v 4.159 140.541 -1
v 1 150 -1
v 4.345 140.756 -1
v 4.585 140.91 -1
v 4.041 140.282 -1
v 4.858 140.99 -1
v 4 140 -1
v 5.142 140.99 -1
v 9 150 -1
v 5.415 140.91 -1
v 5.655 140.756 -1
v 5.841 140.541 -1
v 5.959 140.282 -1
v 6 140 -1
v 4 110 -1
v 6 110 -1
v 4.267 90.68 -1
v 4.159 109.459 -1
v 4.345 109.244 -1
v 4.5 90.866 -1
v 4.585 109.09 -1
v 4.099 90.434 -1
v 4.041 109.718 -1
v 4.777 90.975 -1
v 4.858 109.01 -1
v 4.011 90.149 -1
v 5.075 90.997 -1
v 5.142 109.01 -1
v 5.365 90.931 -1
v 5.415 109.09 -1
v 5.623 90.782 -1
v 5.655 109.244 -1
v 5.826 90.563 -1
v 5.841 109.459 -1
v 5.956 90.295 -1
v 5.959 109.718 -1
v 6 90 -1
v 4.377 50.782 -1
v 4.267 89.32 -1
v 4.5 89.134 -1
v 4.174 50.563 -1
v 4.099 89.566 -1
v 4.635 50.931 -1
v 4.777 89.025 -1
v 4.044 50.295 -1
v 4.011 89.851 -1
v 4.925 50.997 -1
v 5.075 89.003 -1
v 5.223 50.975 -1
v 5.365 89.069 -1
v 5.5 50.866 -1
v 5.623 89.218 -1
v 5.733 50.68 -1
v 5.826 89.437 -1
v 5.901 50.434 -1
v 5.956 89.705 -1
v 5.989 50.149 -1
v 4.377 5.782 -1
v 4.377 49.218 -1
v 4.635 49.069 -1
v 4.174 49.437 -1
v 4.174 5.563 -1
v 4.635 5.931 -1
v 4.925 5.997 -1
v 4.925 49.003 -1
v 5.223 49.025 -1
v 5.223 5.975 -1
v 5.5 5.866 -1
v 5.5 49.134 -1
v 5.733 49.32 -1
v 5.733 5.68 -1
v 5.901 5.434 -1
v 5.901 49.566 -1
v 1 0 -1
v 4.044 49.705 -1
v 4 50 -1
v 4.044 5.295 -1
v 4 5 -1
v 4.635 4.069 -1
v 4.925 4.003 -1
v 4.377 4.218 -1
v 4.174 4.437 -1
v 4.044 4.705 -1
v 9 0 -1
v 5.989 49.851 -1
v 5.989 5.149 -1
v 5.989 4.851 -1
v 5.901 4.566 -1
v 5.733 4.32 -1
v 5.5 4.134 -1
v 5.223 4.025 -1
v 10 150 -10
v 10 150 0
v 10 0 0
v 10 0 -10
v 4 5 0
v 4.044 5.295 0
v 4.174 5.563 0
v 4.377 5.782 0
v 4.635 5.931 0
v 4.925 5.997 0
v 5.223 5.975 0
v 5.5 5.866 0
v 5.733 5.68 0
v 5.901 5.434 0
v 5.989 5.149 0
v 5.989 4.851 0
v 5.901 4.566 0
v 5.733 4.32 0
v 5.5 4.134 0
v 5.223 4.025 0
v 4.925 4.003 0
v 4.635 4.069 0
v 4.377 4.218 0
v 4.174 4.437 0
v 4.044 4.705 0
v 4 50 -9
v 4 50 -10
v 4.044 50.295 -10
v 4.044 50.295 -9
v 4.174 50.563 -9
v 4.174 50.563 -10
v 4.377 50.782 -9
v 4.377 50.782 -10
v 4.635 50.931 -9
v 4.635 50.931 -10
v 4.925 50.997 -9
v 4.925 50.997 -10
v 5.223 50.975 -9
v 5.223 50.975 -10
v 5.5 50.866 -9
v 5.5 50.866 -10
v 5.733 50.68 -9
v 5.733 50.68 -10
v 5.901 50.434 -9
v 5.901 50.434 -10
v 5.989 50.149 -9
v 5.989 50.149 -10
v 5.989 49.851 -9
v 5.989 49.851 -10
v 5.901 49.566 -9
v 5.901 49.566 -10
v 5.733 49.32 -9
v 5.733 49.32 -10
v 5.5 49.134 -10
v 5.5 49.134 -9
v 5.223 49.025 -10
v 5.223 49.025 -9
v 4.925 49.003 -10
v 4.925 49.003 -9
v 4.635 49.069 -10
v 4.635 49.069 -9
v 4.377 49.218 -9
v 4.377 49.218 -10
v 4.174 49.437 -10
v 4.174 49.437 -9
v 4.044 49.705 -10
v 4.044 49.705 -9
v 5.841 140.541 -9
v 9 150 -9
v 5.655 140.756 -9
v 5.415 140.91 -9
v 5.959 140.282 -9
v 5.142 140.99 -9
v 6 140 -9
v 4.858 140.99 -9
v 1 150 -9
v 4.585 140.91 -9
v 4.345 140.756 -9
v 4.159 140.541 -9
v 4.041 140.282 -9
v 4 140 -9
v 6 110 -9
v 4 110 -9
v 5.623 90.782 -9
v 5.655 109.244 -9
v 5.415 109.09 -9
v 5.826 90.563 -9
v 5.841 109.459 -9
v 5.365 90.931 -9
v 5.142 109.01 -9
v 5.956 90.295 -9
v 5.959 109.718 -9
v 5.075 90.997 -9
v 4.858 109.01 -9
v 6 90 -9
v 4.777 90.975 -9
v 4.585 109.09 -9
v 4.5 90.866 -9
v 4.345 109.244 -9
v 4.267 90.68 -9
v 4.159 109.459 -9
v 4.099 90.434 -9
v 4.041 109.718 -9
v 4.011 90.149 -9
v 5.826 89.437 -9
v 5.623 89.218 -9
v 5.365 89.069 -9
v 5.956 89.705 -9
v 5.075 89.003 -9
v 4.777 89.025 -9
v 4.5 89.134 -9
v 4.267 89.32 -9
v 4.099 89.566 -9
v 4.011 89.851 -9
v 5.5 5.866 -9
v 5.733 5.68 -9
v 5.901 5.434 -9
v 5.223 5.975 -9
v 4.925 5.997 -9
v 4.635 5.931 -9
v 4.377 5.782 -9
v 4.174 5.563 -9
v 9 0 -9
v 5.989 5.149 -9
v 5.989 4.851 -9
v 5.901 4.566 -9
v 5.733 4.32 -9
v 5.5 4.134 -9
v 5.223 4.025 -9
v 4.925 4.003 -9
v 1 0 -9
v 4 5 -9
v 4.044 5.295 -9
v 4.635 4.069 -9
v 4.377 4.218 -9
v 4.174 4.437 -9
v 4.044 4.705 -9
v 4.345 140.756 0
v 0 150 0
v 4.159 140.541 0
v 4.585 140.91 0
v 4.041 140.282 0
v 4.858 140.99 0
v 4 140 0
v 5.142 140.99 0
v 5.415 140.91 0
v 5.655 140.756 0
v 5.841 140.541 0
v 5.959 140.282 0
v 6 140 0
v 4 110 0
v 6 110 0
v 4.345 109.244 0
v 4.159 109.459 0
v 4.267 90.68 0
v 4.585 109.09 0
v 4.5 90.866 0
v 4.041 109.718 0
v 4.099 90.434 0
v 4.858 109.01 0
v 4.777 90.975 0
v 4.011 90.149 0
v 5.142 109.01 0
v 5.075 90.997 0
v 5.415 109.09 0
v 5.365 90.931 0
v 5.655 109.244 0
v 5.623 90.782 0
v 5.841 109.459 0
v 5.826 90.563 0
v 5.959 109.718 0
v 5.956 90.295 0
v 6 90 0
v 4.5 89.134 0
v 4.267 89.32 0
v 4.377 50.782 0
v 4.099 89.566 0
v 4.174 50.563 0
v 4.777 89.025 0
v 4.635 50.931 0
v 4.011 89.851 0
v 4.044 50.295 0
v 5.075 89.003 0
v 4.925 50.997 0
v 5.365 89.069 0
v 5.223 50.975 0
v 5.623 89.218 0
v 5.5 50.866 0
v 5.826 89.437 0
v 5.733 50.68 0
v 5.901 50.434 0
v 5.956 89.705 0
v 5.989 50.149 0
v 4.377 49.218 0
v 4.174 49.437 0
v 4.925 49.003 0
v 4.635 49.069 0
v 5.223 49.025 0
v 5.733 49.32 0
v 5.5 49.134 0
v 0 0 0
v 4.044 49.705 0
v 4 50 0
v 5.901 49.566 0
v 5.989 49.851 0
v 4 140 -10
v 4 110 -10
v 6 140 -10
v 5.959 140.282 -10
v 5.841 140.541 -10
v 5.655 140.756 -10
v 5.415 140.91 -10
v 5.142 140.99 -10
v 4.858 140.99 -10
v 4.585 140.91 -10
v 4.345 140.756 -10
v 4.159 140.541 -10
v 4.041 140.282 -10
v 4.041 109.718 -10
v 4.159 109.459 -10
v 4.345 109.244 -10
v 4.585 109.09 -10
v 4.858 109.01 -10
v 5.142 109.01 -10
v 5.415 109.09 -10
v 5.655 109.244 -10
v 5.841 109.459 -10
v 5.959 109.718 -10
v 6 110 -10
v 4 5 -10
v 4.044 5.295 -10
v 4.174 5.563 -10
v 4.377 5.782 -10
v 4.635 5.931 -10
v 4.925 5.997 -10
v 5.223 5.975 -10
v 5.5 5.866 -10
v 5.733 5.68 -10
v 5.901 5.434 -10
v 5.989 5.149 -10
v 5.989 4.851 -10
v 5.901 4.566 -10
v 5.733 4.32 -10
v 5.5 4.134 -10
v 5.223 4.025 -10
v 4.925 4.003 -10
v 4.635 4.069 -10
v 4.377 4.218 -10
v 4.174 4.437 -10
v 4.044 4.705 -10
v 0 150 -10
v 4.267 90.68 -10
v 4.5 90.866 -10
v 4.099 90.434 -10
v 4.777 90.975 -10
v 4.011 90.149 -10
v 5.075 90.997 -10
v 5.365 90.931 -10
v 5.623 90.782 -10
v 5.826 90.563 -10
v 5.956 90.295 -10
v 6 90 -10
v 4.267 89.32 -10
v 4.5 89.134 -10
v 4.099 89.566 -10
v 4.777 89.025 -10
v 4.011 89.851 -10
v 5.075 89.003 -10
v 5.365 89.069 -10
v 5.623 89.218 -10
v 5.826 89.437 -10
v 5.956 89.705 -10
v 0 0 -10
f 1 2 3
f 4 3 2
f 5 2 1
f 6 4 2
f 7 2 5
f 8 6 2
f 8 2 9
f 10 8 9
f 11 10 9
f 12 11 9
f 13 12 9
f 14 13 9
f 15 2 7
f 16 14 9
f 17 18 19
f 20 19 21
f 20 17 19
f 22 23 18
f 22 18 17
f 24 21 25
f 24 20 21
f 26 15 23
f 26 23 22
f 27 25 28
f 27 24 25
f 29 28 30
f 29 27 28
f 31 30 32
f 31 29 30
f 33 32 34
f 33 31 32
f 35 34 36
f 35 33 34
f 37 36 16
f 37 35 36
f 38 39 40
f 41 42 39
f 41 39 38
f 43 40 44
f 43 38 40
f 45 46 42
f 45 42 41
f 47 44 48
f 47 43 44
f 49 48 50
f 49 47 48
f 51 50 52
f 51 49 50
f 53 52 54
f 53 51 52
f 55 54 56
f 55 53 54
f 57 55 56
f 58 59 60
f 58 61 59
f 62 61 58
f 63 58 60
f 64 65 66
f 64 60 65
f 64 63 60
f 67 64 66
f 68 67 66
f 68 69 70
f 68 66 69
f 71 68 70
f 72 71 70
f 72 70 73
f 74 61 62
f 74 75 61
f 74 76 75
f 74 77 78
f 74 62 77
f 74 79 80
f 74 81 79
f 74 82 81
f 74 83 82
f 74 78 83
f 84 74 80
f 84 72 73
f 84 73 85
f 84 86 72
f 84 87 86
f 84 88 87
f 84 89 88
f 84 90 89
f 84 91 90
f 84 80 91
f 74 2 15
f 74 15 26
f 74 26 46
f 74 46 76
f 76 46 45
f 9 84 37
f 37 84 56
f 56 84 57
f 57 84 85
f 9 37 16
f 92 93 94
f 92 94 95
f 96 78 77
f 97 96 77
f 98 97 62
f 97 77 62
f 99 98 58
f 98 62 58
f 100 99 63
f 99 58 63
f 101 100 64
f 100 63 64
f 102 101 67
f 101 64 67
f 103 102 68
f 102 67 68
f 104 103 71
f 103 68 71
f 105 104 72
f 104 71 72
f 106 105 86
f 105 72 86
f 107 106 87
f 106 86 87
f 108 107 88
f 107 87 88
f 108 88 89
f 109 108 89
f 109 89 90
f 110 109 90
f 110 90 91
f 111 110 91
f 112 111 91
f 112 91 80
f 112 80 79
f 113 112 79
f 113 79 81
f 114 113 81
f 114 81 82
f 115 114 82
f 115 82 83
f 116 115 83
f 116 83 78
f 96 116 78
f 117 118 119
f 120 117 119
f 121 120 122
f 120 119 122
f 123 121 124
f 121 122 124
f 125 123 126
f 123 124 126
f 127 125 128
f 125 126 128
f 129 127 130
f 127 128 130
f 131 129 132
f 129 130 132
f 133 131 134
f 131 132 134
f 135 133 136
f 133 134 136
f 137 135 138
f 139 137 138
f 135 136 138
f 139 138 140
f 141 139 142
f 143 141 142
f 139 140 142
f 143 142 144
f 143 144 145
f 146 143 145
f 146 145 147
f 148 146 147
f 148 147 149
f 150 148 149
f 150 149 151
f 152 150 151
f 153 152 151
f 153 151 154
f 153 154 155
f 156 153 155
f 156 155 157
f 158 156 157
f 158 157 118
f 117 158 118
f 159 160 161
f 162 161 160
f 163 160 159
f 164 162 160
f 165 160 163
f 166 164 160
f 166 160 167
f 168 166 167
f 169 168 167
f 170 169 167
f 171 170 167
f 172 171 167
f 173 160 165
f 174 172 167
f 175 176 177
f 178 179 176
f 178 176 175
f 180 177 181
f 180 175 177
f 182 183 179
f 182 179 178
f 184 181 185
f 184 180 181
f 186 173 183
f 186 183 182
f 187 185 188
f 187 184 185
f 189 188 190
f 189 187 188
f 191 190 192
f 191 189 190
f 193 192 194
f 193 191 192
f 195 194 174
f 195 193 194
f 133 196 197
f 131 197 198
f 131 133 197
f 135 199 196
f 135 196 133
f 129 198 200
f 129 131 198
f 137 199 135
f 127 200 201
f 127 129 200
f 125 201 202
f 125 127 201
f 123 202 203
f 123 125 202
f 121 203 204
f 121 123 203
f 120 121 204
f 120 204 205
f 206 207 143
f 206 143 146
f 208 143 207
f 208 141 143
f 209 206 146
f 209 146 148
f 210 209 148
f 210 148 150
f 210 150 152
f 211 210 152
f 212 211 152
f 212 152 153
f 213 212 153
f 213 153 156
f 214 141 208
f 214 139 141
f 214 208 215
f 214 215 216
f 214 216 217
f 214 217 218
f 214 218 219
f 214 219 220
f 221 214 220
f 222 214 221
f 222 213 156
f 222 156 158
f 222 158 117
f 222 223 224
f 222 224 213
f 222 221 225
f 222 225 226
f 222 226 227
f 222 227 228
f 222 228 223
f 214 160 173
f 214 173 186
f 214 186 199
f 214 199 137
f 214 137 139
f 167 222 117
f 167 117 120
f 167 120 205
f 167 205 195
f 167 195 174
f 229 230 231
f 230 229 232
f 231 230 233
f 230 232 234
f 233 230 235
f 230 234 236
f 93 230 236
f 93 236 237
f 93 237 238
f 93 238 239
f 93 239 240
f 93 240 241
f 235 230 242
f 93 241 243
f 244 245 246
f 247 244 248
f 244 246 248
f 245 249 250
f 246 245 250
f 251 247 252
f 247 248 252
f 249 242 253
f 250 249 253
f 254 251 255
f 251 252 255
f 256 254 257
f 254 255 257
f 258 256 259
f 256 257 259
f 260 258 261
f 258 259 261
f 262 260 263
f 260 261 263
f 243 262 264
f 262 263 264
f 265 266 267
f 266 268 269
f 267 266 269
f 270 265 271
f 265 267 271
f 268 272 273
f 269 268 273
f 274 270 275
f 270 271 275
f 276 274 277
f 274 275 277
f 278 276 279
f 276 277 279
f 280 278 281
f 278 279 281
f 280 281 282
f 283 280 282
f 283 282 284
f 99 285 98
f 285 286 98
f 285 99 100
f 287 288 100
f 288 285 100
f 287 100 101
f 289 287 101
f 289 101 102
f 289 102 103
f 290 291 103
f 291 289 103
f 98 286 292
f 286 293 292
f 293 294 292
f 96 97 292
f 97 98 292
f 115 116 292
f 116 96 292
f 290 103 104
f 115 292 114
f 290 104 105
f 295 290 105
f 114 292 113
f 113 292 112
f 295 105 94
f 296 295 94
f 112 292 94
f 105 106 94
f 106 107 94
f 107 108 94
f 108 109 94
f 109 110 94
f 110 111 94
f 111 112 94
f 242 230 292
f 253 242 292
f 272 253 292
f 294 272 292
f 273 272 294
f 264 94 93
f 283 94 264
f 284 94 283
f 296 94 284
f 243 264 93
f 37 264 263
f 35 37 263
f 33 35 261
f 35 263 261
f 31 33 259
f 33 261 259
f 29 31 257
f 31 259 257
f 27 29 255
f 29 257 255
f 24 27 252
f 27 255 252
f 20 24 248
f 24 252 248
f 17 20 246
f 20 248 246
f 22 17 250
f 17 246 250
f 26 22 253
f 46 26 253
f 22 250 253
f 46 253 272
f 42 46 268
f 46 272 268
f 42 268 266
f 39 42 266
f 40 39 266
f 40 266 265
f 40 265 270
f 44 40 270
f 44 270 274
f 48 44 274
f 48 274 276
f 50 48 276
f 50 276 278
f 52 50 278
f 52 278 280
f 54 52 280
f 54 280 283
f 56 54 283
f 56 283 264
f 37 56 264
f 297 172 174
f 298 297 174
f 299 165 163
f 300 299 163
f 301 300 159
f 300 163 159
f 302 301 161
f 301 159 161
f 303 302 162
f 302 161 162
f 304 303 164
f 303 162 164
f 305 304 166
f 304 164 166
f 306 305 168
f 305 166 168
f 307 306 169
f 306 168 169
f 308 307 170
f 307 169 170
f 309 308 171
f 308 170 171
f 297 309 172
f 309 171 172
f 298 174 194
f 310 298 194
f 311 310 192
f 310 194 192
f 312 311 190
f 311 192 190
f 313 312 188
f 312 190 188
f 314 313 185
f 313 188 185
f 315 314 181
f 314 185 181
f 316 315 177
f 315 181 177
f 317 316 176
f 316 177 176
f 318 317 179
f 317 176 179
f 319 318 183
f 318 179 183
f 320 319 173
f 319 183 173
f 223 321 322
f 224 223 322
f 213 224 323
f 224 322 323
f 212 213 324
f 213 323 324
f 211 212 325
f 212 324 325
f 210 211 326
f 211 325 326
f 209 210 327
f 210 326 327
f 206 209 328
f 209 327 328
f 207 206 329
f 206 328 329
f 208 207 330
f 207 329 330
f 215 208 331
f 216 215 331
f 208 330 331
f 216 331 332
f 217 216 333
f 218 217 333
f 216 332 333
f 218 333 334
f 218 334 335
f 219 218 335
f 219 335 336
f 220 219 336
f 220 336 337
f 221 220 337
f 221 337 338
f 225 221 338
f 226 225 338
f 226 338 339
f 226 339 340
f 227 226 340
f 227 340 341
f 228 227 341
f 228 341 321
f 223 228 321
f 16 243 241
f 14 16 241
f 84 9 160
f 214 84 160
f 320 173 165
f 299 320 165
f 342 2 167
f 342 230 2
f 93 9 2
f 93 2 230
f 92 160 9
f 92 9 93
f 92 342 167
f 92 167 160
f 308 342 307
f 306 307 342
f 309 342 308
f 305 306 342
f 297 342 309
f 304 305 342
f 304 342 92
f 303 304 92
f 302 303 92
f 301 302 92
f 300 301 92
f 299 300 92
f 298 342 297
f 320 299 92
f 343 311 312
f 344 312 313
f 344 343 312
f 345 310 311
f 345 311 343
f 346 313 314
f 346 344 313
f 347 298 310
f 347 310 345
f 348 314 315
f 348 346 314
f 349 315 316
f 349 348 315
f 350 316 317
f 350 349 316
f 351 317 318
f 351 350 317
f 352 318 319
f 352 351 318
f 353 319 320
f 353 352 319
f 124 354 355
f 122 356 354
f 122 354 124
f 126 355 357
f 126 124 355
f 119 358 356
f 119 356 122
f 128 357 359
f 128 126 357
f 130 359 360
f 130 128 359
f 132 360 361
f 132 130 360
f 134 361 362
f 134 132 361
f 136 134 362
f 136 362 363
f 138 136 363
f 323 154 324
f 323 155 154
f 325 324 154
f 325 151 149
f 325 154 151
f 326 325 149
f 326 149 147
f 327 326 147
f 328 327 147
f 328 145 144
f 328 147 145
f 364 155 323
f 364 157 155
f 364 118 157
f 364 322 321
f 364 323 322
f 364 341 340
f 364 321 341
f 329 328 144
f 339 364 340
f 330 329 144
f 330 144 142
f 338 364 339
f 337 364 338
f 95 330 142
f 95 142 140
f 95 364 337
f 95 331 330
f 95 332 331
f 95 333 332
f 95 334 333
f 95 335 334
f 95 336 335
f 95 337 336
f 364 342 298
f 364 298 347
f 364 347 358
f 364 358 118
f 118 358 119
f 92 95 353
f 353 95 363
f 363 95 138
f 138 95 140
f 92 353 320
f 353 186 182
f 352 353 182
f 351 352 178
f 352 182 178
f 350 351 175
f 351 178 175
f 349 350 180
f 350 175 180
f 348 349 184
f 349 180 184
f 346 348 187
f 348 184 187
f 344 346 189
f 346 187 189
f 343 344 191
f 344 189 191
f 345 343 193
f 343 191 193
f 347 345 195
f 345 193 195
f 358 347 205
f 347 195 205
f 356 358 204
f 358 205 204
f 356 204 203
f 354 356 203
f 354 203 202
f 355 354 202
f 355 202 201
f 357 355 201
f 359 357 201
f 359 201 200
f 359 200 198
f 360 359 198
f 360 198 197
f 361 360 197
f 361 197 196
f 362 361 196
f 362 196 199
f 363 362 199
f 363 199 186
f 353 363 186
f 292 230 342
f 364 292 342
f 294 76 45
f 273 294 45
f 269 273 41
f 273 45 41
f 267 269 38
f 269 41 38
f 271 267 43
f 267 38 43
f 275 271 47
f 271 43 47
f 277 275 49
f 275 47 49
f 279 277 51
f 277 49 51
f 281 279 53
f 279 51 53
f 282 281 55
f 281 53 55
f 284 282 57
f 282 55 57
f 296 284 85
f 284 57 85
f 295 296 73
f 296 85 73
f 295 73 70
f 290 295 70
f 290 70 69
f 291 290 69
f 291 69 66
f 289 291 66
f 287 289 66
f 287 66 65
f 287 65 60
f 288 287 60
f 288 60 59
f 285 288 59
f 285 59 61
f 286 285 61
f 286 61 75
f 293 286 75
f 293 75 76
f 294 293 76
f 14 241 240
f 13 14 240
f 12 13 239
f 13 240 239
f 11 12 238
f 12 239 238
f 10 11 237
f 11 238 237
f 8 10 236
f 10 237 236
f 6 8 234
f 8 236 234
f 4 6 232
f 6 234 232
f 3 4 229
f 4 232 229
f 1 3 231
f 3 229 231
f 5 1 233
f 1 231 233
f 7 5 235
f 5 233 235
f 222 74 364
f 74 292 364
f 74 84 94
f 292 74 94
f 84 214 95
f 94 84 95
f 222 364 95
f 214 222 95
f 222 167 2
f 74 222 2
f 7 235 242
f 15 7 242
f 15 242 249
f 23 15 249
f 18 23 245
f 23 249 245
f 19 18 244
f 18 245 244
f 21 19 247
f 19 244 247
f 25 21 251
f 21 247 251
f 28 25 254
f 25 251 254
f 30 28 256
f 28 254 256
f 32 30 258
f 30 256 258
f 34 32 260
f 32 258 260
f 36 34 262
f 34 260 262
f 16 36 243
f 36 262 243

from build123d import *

# Parameters (mm, degrees)
SKETCH_1_W          = 10
SKETCH_1_H          = 10
SKETCH_1_W_2        = 6
SKETCH_1_H_2        = 6
EXTRUDE_1_DEPTH     = 150
SKETCH_2_R          = 1
CUT_EXTRUDE_1_DEPTH = 10
SKETCH_3_R          = 1
CUT_EXTRUDE_2_DEPTH = 10
SKETCH_4_R          = 1
CUT_EXTRUDE_3_DEPTH = 10
SKETCH_5_R          = 4
CUT_EXTRUDE_4_DEPTH = 150
SKETCH_6_R          = 1
CUT_EXTRUDE_5_DEPTH = 10


with BuildPart() as part:
    # 草图1 → 凸台-拉伸1 (new body)
    with BuildSketch(Plane(origin=(0, 0, 0), x_dir=(1, 0, 0), z_dir=(0, 1, 0))):
        with Locations((5, 5)):
            Rectangle(SKETCH_1_W, SKETCH_1_H)
        with Locations((5, 5)):
            Rectangle(SKETCH_1_W_2, SKETCH_1_H_2, mode=Mode.SUBTRACT)
    extrude(amount=EXTRUDE_1_DEPTH)

    # 草图2 → 切除-拉伸1 (cut)
    with BuildSketch(Plane.XY):
        with BuildLine():
            Line((4, 140), (4, 110))
            ThreePointArc((4, 110), (5, 111), (6, 110))
            Line((6, 110), (6, 140))
            ThreePointArc((6, 140), (5, 139), (4, 140))
        make_face()
        with Locations((5, 110)):
            Circle(SKETCH_2_R)
        with BuildLine():
            ThreePointArc((6, 140), (5, 141), (4, 140))
            Line((4, 140), (6, 140))
        make_face()
        with BuildLine():
            Line((6, 140), (4, 140))
            ThreePointArc((4, 140), (5, 139), (6, 140))
        make_face()
    extrude(amount=-CUT_EXTRUDE_1_DEPTH, mode=Mode.SUBTRACT)

    # 草图3 → 切除-拉伸2 (cut)
    with BuildSketch(Plane.XY):
        with Locations((5, 90)):
            Circle(SKETCH_3_R)
    extrude(amount=-CUT_EXTRUDE_2_DEPTH, mode=Mode.SUBTRACT)

    # 草图4 → 切除-拉伸3 (cut)
    with BuildSketch(Plane(origin=(0, 0, -10), x_dir=(-1, 0, 0), z_dir=(0, 0, -1))):
        with Locations((-5, 5)):
            Circle(SKETCH_4_R)
    extrude(amount=-CUT_EXTRUDE_3_DEPTH, mode=Mode.SUBTRACT)

    # 草图5 → 切除-拉伸4 (cut)
    with BuildSketch(Plane(origin=(0, 0, 0), x_dir=(1, 0, 0), z_dir=(0, 1, 0))):
        with BuildLine():
            Line((1, 9), (1, 5))
            ThreePointArc((1, 5), (2.171572875, 7.828427125), (5, 9))
            Line((5, 9), (1, 9))
        make_face()
        with Locations((5, 5)):
            Circle(SKETCH_5_R)
        with BuildLine():
            ThreePointArc((5, 1), (2.171572875, 2.171572875), (1, 5))
            Line((1, 5), (1, 1))
            Line((1, 1), (5, 1))
        make_face()
        with BuildLine():
            Line((9, 9), (5, 9))
            ThreePointArc((5, 9), (7.828427125, 7.828427125), (9, 5))
            Line((9, 5), (9, 9))
        make_face()
        with BuildLine():
            ThreePointArc((9, 5), (7.828427125, 2.171572875), (5, 1))
            Line((5, 1), (9, 1))
            Line((9, 1), (9, 5))
        make_face()
    extrude(amount=CUT_EXTRUDE_4_DEPTH, mode=Mode.SUBTRACT)

    # 草图6 → 切除-拉伸5 (cut)
    with BuildSketch(Plane(origin=(0, 0, -10), x_dir=(-1, 0, 0), z_dir=(0, 0, -1))):
        with Locations((-5, 50)):
            Circle(SKETCH_6_R)
    extrude(amount=-CUT_EXTRUDE_5_DEPTH, mode=Mode.SUBTRACT)


solid = part.part
